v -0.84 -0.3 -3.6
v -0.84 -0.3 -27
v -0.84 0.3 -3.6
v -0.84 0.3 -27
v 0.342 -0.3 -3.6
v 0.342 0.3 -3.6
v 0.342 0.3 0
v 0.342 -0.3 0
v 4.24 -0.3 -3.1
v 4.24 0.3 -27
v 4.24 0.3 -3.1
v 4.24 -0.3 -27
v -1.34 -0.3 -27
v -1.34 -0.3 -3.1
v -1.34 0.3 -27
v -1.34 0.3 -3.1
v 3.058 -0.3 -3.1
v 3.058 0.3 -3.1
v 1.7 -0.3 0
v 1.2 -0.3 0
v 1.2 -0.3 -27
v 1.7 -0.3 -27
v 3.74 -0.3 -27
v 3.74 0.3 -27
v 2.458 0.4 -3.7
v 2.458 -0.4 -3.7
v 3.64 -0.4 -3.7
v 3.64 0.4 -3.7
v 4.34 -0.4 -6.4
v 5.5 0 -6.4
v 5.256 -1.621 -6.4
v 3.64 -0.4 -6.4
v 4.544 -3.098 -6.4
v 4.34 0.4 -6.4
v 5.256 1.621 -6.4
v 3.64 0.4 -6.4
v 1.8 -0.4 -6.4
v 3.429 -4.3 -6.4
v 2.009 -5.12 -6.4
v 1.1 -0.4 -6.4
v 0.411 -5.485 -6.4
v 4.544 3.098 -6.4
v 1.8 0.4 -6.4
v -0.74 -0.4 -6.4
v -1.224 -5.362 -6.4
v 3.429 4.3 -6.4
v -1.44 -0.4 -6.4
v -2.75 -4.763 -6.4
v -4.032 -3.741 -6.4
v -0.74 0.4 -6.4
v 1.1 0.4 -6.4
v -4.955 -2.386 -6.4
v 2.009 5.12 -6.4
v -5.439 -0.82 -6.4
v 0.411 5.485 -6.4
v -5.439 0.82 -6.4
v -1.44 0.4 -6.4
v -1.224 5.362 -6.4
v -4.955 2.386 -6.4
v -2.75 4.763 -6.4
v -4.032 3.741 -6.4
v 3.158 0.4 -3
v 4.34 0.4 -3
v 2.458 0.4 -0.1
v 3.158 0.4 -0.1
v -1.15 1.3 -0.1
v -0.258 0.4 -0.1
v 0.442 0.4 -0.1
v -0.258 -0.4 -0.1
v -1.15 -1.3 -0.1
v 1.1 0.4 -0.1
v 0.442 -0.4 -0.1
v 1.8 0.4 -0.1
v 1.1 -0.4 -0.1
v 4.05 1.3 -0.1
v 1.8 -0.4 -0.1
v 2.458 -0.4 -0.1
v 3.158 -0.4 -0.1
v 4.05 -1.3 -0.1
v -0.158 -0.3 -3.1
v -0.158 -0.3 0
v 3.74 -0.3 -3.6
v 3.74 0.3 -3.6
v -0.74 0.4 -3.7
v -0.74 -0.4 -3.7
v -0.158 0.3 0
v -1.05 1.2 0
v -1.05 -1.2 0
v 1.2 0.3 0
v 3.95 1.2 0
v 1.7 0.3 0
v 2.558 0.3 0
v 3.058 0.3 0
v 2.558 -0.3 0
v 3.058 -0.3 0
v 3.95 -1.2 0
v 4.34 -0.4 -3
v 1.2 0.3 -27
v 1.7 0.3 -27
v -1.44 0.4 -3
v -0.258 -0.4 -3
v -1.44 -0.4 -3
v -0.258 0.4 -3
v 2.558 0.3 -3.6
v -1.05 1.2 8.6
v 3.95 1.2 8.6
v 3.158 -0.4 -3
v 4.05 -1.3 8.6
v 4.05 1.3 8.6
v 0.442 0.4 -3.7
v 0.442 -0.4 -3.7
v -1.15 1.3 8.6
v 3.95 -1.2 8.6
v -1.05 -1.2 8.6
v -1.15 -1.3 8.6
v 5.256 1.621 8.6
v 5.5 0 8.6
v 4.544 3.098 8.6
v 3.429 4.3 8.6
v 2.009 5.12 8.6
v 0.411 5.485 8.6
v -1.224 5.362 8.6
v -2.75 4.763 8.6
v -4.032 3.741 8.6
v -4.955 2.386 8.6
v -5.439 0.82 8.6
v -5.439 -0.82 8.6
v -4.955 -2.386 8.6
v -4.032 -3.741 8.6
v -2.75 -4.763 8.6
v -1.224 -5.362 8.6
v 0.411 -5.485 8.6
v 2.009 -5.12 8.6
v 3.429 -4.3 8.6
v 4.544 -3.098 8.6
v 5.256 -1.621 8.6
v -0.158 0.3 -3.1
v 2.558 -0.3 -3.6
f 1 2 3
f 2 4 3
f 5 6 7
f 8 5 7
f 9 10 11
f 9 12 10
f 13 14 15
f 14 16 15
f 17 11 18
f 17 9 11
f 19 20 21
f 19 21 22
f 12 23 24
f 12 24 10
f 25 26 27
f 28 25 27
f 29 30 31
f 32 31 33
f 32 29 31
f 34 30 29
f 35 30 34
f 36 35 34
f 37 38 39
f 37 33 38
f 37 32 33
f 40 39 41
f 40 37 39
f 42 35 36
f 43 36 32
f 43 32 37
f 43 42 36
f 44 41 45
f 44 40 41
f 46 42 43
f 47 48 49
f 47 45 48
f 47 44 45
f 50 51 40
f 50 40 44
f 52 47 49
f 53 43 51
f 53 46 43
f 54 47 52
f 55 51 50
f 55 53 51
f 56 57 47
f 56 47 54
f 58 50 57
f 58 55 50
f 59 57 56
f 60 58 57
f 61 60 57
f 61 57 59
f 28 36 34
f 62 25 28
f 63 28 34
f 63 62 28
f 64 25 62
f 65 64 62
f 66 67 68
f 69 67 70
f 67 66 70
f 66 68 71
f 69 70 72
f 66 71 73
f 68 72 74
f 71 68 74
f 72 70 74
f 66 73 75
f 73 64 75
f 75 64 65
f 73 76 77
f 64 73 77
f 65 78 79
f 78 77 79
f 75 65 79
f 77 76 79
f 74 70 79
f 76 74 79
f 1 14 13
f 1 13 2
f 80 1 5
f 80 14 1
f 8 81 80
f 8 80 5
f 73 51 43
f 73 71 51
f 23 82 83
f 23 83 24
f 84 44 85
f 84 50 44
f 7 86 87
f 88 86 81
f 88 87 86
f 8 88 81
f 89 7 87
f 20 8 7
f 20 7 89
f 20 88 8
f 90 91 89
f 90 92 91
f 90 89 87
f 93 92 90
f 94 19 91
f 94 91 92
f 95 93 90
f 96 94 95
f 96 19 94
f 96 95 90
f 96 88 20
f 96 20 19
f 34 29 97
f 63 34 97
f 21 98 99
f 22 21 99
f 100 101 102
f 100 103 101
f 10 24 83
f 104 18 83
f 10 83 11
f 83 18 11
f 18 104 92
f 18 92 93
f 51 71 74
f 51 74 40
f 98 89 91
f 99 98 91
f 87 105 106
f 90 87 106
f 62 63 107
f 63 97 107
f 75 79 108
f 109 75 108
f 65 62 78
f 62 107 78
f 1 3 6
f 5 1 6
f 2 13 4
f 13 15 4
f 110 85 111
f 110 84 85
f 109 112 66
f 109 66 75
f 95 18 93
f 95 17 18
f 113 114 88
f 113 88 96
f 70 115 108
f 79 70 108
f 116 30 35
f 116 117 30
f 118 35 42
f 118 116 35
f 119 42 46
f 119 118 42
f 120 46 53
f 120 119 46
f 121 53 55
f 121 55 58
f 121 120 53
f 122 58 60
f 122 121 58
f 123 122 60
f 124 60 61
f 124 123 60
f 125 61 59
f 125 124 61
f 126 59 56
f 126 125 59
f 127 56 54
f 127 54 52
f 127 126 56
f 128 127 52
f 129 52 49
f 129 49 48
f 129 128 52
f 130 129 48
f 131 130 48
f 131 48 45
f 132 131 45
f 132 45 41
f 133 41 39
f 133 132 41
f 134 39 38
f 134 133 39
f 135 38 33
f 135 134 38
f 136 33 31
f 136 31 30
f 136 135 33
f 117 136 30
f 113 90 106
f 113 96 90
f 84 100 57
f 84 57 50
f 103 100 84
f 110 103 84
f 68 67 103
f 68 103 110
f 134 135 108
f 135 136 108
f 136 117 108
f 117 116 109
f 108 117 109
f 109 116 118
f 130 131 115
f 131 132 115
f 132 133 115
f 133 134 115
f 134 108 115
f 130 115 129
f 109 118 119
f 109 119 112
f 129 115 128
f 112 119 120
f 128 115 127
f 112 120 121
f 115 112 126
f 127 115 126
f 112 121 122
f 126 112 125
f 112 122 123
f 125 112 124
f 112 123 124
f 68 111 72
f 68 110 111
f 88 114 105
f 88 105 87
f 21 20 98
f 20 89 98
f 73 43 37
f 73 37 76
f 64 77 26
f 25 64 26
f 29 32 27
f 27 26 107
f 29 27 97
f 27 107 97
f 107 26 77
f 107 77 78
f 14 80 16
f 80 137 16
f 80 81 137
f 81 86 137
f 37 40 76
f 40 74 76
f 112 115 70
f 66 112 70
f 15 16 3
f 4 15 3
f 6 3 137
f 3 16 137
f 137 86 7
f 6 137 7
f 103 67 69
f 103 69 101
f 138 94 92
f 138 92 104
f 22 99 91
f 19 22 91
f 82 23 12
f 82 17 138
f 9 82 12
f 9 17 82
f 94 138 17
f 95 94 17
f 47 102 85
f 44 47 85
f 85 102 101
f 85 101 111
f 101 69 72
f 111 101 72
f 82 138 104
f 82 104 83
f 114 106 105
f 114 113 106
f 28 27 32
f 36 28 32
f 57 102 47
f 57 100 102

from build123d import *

# Parameters (mm, degrees)
F3_DEPTH  = 1.2
F4_DEPTH  = 0.3
F6_W      = 5.5
F6_H      = 15
F8_OFFSET = 0.1


with BuildPart() as f3:
    # F2 (on Front) → F3 (new body, symmetric)
    with BuildSketch(Plane.XZ):
        Polygon((2.5, 8.6), (0, 8.6), (-2.5, 8.6), (-2.5, 0), (-1.6084526777, 0), (-1.1084526777, 0), (-0.25, 0), (0, 0), (0.25, 0), (1.1084526777, 0), (1.6084526777, 0), (2.5, 0), align=None)
    extrude(amount=F3_DEPTH, both=True)

    # F2 (on Front) → F4 (join, symmetric)
    with BuildSketch(Plane.XZ):
        Polygon((-1.1084526777, 0), (-1.6084526777, 0), (-1.6084526777, -3.1), (-2.79, -3.1), (-2.79, -27), (-2.29, -27), (-2.29, -3.6), (-1.1084526777, -3.6), align=None)
        Polygon((0.25, -27), (0.25, 0), (0, 0), (-0.25, 0), (-0.25, -27), (0, -27), align=None)
        Polygon((1.6084526777, -3.1), (1.6084526777, 0), (1.1084526777, 0), (1.1084526777, -3.6), (2.29, -3.6), (2.29, -27), (2.79, -27), (2.79, -3.1), align=None)
    extrude(amount=F4_DEPTH, both=True)


with BuildPart() as f3_1:
    # F5: moved
    add(f3.part.moved(Location((1.45, 0, 0))))


with BuildPart() as f7:
    # F6 (on Front) → F7 (revolve)
    with BuildSketch(Plane.XZ):
        with Locations((2.75, 1.1)):
            Rectangle(F6_W, F6_H)
    revolve(axis=Axis((0, 0, 1.1), (0, 0, 1)))

    # F8: cut F3, made larger all round first
    f8_tool = offset(f3_1.part, amount=F8_OFFSET, kind=Kind.INTERSECTION, mode=Mode.PRIVATE)
    add(f8_tool, mode=Mode.SUBTRACT)


solid = Compound([f3_1.part, f7.part])
